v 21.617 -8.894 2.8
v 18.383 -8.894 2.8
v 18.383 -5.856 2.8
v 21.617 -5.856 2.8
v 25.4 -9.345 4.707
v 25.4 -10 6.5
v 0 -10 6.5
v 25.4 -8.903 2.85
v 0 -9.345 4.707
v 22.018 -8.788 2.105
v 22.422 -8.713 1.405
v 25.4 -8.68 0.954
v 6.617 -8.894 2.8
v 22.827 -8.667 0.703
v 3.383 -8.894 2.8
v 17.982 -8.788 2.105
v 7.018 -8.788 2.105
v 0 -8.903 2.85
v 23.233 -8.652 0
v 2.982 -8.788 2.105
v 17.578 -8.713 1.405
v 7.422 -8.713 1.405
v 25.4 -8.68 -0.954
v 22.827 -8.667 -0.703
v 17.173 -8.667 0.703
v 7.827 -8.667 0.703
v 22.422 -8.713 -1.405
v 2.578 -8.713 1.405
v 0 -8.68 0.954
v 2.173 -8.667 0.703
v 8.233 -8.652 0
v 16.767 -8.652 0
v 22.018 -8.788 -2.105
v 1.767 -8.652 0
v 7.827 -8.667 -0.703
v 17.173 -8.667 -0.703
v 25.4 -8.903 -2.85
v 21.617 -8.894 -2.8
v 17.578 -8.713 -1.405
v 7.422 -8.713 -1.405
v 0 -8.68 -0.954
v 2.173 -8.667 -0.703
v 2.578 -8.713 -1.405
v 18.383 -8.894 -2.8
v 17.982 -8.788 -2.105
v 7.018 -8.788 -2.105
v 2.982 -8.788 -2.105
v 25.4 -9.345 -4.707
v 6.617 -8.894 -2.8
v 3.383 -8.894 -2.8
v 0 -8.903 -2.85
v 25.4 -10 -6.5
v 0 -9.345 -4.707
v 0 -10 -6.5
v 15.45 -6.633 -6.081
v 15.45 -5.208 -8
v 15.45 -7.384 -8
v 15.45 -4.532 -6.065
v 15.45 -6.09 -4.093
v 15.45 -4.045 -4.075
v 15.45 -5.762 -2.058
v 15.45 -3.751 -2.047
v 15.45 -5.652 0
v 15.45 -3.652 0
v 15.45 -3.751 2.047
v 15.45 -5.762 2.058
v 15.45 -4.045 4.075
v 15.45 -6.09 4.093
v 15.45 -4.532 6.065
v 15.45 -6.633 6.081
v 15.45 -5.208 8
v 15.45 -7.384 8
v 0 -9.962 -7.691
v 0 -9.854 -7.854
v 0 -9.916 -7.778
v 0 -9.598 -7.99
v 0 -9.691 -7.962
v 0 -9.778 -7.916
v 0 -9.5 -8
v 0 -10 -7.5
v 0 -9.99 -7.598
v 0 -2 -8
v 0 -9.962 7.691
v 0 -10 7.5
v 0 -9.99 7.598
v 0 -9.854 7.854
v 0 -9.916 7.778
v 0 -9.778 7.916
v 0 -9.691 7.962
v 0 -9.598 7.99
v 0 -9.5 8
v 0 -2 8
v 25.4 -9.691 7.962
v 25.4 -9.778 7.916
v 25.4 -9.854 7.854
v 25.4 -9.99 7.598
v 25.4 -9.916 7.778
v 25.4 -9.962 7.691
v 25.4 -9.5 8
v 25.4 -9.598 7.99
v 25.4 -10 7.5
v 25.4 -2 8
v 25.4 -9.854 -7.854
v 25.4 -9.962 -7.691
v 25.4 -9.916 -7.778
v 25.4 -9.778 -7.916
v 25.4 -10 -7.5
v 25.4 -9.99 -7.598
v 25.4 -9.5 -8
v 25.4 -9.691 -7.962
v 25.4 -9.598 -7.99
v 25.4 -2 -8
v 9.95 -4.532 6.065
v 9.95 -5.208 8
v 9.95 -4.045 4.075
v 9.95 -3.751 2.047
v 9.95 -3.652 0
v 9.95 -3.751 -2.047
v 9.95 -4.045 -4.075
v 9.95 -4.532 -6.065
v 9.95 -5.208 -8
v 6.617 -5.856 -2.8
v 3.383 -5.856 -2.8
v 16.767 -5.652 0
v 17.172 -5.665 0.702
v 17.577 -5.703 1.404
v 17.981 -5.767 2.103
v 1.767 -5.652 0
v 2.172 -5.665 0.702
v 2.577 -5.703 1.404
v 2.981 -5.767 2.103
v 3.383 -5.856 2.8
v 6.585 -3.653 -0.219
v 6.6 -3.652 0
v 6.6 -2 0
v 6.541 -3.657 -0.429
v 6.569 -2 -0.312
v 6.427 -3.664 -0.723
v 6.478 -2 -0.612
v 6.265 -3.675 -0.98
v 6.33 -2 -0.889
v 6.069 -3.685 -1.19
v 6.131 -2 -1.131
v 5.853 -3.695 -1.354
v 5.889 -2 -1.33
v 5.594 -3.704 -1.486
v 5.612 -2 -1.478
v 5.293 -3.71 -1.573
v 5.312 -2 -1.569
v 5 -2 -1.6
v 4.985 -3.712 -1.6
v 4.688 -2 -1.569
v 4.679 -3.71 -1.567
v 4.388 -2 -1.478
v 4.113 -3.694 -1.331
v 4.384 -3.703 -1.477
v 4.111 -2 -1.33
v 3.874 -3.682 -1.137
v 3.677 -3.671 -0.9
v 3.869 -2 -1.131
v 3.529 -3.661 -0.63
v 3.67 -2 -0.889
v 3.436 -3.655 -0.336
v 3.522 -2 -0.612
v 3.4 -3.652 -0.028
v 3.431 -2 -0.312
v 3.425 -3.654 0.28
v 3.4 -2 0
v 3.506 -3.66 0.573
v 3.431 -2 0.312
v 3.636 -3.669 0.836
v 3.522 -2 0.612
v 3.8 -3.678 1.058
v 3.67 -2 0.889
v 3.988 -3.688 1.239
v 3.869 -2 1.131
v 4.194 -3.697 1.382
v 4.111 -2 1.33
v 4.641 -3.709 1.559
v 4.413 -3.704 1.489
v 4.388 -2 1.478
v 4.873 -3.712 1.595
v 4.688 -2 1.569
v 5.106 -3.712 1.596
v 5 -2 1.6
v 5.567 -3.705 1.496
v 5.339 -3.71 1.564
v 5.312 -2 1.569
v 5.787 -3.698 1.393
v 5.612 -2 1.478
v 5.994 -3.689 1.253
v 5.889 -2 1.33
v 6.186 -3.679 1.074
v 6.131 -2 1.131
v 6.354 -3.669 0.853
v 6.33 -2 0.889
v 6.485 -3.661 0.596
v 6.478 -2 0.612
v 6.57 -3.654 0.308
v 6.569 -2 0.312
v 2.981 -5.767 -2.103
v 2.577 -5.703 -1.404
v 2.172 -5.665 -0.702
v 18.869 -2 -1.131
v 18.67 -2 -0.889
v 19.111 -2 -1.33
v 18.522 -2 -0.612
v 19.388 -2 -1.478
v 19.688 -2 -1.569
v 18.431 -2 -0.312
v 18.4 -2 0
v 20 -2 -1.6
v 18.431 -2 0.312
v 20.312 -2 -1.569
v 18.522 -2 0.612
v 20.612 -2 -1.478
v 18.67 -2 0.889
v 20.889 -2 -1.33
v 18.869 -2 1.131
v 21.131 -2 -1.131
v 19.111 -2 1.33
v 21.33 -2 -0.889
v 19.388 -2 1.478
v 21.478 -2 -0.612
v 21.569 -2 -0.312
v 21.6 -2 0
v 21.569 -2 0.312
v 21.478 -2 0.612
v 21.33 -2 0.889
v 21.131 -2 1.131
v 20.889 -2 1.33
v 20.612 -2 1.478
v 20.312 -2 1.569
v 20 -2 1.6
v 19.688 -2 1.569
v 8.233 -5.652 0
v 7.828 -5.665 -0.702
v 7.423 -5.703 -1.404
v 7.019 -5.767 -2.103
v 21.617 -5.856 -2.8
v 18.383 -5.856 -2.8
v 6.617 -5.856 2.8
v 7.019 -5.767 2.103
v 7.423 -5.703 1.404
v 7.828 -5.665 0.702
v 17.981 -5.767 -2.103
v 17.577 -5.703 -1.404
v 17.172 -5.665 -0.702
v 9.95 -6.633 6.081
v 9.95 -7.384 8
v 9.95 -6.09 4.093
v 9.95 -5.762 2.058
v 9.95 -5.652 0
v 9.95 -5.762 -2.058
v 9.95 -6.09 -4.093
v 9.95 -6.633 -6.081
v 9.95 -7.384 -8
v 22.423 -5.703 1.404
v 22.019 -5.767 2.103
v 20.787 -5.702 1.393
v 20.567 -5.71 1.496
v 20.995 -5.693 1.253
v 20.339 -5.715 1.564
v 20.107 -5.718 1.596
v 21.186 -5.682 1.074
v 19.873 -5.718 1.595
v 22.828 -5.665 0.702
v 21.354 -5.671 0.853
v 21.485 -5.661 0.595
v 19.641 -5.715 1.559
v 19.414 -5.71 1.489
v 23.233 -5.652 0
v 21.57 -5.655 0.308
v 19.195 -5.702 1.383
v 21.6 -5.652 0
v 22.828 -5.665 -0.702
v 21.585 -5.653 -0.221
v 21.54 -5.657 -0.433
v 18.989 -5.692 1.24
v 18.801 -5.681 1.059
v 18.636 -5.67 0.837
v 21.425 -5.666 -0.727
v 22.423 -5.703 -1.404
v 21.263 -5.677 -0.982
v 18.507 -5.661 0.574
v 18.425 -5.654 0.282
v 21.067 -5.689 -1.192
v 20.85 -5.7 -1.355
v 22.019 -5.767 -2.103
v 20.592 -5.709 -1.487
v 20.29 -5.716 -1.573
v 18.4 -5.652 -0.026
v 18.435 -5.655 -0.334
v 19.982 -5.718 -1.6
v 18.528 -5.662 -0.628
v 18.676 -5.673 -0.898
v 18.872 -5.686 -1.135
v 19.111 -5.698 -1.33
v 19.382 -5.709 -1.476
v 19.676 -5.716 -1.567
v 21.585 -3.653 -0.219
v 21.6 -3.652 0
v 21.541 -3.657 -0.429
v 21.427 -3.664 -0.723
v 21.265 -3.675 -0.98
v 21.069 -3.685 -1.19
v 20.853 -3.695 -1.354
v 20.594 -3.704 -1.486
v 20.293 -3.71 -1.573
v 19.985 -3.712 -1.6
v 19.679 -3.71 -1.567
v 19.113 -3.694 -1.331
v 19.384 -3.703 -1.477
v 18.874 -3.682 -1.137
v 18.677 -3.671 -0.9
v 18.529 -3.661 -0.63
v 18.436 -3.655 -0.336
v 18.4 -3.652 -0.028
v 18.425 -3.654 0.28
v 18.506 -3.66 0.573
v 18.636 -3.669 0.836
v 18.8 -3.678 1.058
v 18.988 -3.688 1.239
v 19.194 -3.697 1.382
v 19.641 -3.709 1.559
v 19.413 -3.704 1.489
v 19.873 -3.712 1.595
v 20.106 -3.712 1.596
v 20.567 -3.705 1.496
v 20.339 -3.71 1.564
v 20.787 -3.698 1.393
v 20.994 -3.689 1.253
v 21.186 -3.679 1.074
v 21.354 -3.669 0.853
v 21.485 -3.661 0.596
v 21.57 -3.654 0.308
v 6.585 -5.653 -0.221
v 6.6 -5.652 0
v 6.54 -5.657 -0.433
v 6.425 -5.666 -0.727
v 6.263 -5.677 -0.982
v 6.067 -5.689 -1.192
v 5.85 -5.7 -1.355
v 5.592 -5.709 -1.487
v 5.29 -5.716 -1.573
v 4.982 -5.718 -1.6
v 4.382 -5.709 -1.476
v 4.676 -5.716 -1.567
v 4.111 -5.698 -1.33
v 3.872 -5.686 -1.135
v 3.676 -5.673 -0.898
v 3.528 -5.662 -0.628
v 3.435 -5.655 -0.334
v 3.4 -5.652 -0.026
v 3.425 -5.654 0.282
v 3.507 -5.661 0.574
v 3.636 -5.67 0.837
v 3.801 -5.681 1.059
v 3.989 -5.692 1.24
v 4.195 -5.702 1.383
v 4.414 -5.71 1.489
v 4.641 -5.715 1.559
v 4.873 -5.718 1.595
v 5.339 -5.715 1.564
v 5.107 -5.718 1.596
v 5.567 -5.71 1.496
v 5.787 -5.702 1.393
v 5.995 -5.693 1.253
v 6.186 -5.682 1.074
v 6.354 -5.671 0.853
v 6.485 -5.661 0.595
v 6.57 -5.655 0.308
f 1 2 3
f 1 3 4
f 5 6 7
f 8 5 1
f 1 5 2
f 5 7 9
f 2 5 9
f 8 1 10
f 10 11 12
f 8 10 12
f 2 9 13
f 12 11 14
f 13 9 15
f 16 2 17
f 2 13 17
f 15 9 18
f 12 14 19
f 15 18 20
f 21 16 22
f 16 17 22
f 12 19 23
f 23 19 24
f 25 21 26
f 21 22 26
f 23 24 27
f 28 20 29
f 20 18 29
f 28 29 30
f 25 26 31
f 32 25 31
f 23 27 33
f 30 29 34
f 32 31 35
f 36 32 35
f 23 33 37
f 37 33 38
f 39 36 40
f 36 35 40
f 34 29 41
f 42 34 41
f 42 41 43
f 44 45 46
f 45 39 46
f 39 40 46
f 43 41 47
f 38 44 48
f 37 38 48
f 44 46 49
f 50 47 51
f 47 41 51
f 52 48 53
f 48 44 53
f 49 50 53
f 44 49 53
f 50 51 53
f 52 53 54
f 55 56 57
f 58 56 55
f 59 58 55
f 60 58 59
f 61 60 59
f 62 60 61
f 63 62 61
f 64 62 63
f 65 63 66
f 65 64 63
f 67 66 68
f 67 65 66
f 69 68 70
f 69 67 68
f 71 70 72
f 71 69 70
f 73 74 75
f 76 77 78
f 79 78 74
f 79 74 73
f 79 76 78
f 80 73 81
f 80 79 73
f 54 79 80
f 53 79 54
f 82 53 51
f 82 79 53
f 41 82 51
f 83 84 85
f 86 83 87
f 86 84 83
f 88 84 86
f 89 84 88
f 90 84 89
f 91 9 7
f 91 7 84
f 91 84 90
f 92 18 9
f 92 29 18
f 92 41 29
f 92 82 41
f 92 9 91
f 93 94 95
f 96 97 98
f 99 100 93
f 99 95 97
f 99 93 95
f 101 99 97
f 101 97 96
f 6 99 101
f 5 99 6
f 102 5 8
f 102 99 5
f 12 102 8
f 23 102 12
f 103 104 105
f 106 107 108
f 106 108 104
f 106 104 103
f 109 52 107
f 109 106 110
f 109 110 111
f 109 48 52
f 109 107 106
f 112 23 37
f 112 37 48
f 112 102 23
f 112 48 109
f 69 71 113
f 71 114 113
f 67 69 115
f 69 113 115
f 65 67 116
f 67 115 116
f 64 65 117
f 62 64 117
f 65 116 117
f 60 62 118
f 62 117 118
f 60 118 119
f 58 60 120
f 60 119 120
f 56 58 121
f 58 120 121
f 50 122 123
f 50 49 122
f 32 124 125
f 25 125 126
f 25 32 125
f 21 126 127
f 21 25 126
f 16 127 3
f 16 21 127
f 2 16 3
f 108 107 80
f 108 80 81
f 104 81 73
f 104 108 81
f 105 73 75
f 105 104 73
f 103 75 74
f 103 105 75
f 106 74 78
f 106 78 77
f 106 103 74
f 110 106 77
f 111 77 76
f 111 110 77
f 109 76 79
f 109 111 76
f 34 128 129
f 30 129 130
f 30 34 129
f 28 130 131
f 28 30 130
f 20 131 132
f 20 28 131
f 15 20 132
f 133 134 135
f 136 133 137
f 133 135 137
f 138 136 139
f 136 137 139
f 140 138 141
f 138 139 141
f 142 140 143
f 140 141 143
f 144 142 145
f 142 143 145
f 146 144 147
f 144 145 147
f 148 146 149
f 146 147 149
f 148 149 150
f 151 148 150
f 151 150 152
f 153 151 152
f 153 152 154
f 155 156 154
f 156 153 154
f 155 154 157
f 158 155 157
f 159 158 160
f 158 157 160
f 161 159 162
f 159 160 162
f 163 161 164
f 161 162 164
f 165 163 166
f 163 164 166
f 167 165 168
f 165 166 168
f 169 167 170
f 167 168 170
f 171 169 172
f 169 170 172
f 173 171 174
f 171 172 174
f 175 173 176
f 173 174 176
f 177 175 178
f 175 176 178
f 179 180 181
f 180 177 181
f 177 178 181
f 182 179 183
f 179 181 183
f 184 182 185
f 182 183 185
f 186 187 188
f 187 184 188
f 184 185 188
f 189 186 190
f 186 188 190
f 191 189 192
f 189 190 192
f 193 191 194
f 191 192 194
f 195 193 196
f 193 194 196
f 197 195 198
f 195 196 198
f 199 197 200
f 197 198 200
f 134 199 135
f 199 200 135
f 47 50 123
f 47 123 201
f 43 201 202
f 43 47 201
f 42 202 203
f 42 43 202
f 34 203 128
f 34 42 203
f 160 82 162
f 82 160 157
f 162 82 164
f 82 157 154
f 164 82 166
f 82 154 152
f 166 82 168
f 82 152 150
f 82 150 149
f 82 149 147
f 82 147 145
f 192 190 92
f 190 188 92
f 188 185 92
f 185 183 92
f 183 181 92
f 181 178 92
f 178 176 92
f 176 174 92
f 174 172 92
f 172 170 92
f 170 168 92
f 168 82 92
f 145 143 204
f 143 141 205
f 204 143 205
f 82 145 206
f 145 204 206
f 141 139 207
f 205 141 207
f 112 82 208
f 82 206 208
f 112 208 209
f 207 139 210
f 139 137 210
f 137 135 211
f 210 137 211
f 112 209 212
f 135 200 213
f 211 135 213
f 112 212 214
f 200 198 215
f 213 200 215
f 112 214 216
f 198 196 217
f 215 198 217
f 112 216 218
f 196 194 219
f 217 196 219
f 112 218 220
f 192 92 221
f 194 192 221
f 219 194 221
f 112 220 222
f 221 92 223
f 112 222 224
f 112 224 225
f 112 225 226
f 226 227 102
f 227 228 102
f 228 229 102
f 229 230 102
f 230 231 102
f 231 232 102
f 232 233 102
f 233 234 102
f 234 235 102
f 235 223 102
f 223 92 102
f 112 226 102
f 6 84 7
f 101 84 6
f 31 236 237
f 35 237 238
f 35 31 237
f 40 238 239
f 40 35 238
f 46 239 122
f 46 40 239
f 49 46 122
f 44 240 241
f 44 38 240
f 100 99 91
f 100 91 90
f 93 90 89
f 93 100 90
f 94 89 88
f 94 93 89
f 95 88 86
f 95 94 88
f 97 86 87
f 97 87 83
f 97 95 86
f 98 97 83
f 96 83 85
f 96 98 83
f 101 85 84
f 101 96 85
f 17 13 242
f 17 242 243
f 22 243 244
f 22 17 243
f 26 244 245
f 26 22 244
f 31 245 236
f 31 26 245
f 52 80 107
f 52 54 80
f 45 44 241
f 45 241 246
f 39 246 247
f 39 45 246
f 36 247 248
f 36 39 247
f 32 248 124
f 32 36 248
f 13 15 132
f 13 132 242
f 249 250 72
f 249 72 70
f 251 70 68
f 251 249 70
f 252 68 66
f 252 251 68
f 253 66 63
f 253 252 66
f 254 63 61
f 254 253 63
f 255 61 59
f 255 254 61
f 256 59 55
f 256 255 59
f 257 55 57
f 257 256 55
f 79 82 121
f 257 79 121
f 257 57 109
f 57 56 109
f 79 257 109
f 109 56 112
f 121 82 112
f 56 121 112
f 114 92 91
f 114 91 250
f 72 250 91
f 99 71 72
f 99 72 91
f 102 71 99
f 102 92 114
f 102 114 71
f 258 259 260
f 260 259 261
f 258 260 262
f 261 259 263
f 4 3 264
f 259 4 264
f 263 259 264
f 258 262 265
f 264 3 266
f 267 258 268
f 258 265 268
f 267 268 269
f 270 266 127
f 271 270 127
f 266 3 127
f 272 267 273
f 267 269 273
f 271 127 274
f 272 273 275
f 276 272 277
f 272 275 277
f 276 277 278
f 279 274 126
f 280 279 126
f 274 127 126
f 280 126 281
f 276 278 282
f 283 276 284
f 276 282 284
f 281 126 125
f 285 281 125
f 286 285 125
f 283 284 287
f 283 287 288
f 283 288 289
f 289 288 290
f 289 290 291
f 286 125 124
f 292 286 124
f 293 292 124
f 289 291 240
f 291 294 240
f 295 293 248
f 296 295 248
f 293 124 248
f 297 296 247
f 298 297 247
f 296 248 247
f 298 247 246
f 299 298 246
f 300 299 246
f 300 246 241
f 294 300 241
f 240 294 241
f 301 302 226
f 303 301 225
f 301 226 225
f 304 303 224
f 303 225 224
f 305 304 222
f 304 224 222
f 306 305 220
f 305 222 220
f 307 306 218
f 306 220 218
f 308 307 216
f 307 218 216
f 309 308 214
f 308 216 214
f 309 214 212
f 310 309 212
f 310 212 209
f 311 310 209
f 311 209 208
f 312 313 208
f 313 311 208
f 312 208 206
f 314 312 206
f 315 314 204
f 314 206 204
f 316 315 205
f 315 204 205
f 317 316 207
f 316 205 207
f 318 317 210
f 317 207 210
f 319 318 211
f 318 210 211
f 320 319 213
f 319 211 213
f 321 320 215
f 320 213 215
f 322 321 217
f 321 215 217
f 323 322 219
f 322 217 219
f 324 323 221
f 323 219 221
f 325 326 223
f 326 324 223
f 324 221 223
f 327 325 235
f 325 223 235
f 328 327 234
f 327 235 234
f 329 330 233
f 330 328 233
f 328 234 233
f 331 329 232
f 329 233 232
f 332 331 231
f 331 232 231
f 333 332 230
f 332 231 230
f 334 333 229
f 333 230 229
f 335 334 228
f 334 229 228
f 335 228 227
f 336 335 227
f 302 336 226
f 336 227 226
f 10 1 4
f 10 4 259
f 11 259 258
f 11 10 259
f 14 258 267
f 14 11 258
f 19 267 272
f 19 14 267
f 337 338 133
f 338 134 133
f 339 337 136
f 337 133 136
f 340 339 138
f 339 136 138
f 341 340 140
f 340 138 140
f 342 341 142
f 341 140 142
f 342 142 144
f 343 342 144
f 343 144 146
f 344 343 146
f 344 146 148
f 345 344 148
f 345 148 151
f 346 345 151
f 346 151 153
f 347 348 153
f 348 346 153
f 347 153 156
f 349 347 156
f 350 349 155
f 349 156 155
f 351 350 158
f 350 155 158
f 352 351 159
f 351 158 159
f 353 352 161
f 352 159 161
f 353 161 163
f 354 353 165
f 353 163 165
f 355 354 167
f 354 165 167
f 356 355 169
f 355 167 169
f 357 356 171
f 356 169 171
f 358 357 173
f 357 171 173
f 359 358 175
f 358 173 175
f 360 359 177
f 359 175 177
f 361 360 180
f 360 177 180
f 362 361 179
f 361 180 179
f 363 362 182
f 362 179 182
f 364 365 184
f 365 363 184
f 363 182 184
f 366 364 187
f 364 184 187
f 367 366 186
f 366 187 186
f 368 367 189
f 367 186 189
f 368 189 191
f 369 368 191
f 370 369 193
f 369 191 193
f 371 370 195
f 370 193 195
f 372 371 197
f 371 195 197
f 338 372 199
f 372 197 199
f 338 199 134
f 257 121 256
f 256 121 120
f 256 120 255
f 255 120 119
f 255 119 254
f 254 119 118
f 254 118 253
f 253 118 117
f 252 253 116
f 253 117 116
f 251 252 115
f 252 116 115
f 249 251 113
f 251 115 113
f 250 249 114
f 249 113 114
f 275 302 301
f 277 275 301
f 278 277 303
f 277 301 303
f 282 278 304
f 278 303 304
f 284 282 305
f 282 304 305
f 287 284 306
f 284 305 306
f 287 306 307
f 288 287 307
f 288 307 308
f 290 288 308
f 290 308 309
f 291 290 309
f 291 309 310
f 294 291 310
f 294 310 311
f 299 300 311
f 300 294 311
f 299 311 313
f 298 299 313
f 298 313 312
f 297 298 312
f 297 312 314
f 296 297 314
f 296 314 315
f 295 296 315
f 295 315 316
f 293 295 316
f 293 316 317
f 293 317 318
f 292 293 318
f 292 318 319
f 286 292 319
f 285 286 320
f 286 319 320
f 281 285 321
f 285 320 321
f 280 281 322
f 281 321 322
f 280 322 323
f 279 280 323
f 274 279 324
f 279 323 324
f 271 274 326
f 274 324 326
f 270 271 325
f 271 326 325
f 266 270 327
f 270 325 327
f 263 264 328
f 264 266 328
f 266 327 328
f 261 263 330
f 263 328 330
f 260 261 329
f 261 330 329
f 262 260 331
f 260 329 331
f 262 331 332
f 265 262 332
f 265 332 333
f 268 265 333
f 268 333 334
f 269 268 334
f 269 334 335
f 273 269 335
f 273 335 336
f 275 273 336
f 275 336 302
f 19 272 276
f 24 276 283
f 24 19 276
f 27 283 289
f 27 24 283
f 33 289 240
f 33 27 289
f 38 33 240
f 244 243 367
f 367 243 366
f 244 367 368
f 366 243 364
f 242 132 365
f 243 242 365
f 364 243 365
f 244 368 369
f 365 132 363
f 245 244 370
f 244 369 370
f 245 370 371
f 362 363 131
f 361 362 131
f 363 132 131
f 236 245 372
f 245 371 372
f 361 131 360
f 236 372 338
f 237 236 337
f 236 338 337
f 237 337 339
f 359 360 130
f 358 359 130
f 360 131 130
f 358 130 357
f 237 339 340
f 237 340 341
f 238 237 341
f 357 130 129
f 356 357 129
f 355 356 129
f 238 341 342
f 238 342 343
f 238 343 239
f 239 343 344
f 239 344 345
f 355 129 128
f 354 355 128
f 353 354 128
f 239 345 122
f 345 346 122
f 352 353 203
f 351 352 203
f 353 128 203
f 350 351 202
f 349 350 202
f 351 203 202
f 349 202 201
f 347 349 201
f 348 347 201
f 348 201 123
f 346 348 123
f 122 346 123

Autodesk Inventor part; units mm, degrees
ref_plane "YZ Plane" through (0, 0, 0) normal (1, 0, 0) x (0, 1, 0)
ref_plane "XZ Plane" through (0, 0, 0) normal (0, 1, 0) x (-1, 0, 0)
ref_plane "XY Plane" through (0, 0, 0) normal (0, 0, 1) x (1, 0, 0)
ref_plane "Arbeitsebene1" through (-0.5, 0, -8) normal (0, -1, 0) x (1, 0, 0)
sketch "Skizze1" plane through (-0.5, 0, -8) normal (0, -1, 0) x (1, 0, 0)
  line L0 (-6.1, 20) -> (0.5, 20)
  line L1 (0.5, 20) -> (0.5, -4)
  line L2 (0.5, -4) -> (-6.1, -4)
  line L3 (-6.1, -4) -> (-6.1, 20)
  line L4 (0.5, 0) -> (32.9, 0) projected
  line L5 (0.5, 16) -> (34.9, 16) projected
  line L6 (0.5, 0) -> (34.9, 0)
  line L7 (34.9, 0) -> (34.9, 16)
  line L8 (34.9, 16) -> (0.5, 16)
  line L9 (0.5, 16) -> (0.5, 0)
  circle A0 centre (5.5, 8) radius 1.6 projected
  circle A1 centre (5.5, 8) radius 1.6
  circle A2 centre (20.5, 8) radius 1.6 projected
  circle A3 centre (20.5, 8) radius 1.6
  circle A4 centre (5.5, 8) radius 2.75
  circle A5 centre (20.5, 8) radius 2.75
  point P0 (0.5, 8)
  dimension "d0" = 5.5
  dimension "d1" = 5.5
extrude "Extrusion1" add sketch "Skizze1" along normal blind 10 contours L0 L1 L2 L3 | L5 L7 L6 L4 L1 | A4 | A5
ref_plane "Arbeitsebene2" through (-6.6, 0, -12) normal (-1, 0, 0) x (0, 0, 1)
sketch "Skizze2" plane through (-6.6, 0, -12) normal (-1, 0, 0) x (0, 0, 1)
  line L0 (0, -10) -> (4, -10) projected
  line L1 (0, -10) -> (24, -10)
  line L2 (24, -10) -> (24, -25)
  line L3 (24, -25) -> (0, -25)
  line L4 (0, -25) -> (0, -10)
  line L5 (0, 0) -> (0, -10) projected
  line L6 (0, 0) -> (4, 0) projected
  line L7 (0, -10) -> (2, -10)
  line L8 (2, -10) -> (2, 0)
  line L9 (2, 0) -> (0, 0)
  line L10 (0, 0) -> (0, -10)
  line L11 (4, 0) -> (4, -10) projected
  line L12 (4, -10) -> (20, -10)
  line L13 (20, -10) -> (20, -20)
  line L14 (20, -20) -> (4, -20)
  line L15 (4, -20) -> (4, -10)
  line L16 (4, -10) -> (5.5, -10)
  line L17 (5.5, -10) -> (5.5, -20)
  line L18 (5.5, -20) -> (4, -20)
  line L19 (4, -20) -> (4, -10)
  circle A0 centre (12, -25) radius 16.3478
  line L20 (12, -8.6522) -> (12, -5.6522)
  line L21 (12, -5.6522) -> (12, -3.6522)
  circle A1 centre (12, -25) radius 19.3478
  circle A2 centre (12, -25) radius 21.3478
  line L22 (4, -20) -> (20, -20)
  line L23 (20, -20) -> (20, 0)
  line L24 (20, 0) -> (4, 0)
  line L25 (4, 0) -> (4, -20)
  point P0 (12, 0)
  point P1 (18.5, -10)
  point P2 (20, -7.3836)
  point P3 (20, -5.2079)
  point P4 (4, -5.2079)
  point P5 (4, -7.3836)
  dimension "d4" = 15
  dimension "d5" = 16
  dimension "d6" = 10
  dimension "d7" = 1.5
  dimension "d14" = 3
  dimension "d15" = 2
extrude "Extrusion2" cut sketch "Skizze2" against normal up to surface (41 mm away) contours A0 L1
sketch "Skizze4" plane through (-0.5, -10, -8) normal (0, -1, 0) x (1, 0, 0)
  circle A0 centre (20.5, 8) radius 1.6 projected
  circle A1 centre (20.5, 8) radius 2.8
  circle A2 centre (5.5, 8) radius 1.6 projected
  circle A3 centre (5.5, 8) radius 2.8
  line L0 (7.1166, 10.8) -> (8.7332, 8)
  line L1 (8.7332, 8) -> (7.1166, 5.2)
  line L2 (7.1166, 5.2) -> (3.8834, 5.2)
  line L3 (3.8834, 5.2) -> (2.2668, 8)
  line L4 (2.2668, 8) -> (3.8834, 10.8)
  line L5 (3.8834, 10.8) -> (7.1166, 10.8)
  line L6 (22.1166, 10.8) -> (23.7332, 8)
  line L7 (23.7332, 8) -> (22.1166, 5.2)
  line L8 (22.1166, 5.2) -> (18.8834, 5.2)
  line L9 (18.8834, 5.2) -> (17.2668, 8)
  line L10 (17.2668, 8) -> (18.8834, 10.8)
  line L11 (18.8834, 10.8) -> (22.1166, 10.8)
  point P0 (0.5, 8)
  point P1 (5.5, 10.8)
  point P2 (20.5, 10.8)
  dimension "d29" = 5.6
  dimension "d30" = 5.6
extrude "Extrusion3" cut sketch "Skizze4" against normal blind 5 contours A0 | A1 | A1 L6 L7 | A1 L11 L6 | L7 L8 A1 | A1 L10 L11 | L8 L9 A1 | A1 L9 L10 | A2 | A3 | A3 L0 L1 | A3 L5 L0 | L1 L2 A3 | A3 L4 L5 | L2 L3 A3 | A3 L3 L4
extrude "Extrusion4" cut sketch "Skizze2" against normal blind 38 contours L11 A2 L21 A1 | A1 L21 A2 L23
extrude "Extrusion5" add sketch "Skizze2" against normal blind 32.5 contours L11 A2 L21 A1 | A1 L21 A2 L23
extrude "Extrusion6" cut sketch "Skizze2" against normal blind 22.05 contours L11 A2 L21 A1 | A1 L21 A2 L23
extrude "Extrusion7" add sketch "Skizze2" against normal blind 16.55 contours L11 A2 L21 A1 | A1 L21 A2 L23
extrude "Extrusion8" cut sketch "Skizze1" along normal blind 16.55 contours A0 | A2
extrude "Extrusion9" cut sketch "Skizze1" along normal blind 2 contours L0 L1 L2 L3 | L5 L7 L6 L4 L1 | A4 | A5
fillet "Rundung1" radius 0.5 9 edges at (-3.3, -10, 12) (0, -10, 10) (17.2, -10, 8) (34.4, -10, 7.25) (34.4, -8.6522, 0) (34.4, -10, -7.25) (17.2, -10, -8) (0, -10, -10) (-3.3, -10, -12)
sketch "Skizze6" plane through (34.4, -2, 8) normal (1, 0, 0) x (0, 0, -1)
  line L0 (-31.6615, 20.7831) -> (48.4189, 20.7831)
  line L1 (48.4189, 20.7831) -> (48.4189, -28.9012)
  line L2 (48.4189, -28.9012) -> (-31.6615, -28.9012)
  line L3 (-31.6615, -28.9012) -> (-31.6615, 20.7831)
  point P0 (8, 2)
extrude "Extrusion10" cut sketch "Skizze6" against normal blind 9
sketch "Skizze7" plane through (-6.6, -25, 0) normal (-1, 0, 0) x (0, 0, 1)
  line L0 (-50.9718, 43.6316) -> (27.5939, 43.6316)
  line L1 (27.5939, 43.6316) -> (27.5939, 3.9448)
  line L2 (27.5939, 3.9448) -> (-50.9718, 3.9448)
  line L3 (-50.9718, 3.9448) -> (-50.9718, 43.6316)
  point P0 (0, 25)
extrude "Extrusion11" cut sketch "Skizze7" against normal blind 6.6
properties part number "OBS-Displaymountadapter_schmal"
